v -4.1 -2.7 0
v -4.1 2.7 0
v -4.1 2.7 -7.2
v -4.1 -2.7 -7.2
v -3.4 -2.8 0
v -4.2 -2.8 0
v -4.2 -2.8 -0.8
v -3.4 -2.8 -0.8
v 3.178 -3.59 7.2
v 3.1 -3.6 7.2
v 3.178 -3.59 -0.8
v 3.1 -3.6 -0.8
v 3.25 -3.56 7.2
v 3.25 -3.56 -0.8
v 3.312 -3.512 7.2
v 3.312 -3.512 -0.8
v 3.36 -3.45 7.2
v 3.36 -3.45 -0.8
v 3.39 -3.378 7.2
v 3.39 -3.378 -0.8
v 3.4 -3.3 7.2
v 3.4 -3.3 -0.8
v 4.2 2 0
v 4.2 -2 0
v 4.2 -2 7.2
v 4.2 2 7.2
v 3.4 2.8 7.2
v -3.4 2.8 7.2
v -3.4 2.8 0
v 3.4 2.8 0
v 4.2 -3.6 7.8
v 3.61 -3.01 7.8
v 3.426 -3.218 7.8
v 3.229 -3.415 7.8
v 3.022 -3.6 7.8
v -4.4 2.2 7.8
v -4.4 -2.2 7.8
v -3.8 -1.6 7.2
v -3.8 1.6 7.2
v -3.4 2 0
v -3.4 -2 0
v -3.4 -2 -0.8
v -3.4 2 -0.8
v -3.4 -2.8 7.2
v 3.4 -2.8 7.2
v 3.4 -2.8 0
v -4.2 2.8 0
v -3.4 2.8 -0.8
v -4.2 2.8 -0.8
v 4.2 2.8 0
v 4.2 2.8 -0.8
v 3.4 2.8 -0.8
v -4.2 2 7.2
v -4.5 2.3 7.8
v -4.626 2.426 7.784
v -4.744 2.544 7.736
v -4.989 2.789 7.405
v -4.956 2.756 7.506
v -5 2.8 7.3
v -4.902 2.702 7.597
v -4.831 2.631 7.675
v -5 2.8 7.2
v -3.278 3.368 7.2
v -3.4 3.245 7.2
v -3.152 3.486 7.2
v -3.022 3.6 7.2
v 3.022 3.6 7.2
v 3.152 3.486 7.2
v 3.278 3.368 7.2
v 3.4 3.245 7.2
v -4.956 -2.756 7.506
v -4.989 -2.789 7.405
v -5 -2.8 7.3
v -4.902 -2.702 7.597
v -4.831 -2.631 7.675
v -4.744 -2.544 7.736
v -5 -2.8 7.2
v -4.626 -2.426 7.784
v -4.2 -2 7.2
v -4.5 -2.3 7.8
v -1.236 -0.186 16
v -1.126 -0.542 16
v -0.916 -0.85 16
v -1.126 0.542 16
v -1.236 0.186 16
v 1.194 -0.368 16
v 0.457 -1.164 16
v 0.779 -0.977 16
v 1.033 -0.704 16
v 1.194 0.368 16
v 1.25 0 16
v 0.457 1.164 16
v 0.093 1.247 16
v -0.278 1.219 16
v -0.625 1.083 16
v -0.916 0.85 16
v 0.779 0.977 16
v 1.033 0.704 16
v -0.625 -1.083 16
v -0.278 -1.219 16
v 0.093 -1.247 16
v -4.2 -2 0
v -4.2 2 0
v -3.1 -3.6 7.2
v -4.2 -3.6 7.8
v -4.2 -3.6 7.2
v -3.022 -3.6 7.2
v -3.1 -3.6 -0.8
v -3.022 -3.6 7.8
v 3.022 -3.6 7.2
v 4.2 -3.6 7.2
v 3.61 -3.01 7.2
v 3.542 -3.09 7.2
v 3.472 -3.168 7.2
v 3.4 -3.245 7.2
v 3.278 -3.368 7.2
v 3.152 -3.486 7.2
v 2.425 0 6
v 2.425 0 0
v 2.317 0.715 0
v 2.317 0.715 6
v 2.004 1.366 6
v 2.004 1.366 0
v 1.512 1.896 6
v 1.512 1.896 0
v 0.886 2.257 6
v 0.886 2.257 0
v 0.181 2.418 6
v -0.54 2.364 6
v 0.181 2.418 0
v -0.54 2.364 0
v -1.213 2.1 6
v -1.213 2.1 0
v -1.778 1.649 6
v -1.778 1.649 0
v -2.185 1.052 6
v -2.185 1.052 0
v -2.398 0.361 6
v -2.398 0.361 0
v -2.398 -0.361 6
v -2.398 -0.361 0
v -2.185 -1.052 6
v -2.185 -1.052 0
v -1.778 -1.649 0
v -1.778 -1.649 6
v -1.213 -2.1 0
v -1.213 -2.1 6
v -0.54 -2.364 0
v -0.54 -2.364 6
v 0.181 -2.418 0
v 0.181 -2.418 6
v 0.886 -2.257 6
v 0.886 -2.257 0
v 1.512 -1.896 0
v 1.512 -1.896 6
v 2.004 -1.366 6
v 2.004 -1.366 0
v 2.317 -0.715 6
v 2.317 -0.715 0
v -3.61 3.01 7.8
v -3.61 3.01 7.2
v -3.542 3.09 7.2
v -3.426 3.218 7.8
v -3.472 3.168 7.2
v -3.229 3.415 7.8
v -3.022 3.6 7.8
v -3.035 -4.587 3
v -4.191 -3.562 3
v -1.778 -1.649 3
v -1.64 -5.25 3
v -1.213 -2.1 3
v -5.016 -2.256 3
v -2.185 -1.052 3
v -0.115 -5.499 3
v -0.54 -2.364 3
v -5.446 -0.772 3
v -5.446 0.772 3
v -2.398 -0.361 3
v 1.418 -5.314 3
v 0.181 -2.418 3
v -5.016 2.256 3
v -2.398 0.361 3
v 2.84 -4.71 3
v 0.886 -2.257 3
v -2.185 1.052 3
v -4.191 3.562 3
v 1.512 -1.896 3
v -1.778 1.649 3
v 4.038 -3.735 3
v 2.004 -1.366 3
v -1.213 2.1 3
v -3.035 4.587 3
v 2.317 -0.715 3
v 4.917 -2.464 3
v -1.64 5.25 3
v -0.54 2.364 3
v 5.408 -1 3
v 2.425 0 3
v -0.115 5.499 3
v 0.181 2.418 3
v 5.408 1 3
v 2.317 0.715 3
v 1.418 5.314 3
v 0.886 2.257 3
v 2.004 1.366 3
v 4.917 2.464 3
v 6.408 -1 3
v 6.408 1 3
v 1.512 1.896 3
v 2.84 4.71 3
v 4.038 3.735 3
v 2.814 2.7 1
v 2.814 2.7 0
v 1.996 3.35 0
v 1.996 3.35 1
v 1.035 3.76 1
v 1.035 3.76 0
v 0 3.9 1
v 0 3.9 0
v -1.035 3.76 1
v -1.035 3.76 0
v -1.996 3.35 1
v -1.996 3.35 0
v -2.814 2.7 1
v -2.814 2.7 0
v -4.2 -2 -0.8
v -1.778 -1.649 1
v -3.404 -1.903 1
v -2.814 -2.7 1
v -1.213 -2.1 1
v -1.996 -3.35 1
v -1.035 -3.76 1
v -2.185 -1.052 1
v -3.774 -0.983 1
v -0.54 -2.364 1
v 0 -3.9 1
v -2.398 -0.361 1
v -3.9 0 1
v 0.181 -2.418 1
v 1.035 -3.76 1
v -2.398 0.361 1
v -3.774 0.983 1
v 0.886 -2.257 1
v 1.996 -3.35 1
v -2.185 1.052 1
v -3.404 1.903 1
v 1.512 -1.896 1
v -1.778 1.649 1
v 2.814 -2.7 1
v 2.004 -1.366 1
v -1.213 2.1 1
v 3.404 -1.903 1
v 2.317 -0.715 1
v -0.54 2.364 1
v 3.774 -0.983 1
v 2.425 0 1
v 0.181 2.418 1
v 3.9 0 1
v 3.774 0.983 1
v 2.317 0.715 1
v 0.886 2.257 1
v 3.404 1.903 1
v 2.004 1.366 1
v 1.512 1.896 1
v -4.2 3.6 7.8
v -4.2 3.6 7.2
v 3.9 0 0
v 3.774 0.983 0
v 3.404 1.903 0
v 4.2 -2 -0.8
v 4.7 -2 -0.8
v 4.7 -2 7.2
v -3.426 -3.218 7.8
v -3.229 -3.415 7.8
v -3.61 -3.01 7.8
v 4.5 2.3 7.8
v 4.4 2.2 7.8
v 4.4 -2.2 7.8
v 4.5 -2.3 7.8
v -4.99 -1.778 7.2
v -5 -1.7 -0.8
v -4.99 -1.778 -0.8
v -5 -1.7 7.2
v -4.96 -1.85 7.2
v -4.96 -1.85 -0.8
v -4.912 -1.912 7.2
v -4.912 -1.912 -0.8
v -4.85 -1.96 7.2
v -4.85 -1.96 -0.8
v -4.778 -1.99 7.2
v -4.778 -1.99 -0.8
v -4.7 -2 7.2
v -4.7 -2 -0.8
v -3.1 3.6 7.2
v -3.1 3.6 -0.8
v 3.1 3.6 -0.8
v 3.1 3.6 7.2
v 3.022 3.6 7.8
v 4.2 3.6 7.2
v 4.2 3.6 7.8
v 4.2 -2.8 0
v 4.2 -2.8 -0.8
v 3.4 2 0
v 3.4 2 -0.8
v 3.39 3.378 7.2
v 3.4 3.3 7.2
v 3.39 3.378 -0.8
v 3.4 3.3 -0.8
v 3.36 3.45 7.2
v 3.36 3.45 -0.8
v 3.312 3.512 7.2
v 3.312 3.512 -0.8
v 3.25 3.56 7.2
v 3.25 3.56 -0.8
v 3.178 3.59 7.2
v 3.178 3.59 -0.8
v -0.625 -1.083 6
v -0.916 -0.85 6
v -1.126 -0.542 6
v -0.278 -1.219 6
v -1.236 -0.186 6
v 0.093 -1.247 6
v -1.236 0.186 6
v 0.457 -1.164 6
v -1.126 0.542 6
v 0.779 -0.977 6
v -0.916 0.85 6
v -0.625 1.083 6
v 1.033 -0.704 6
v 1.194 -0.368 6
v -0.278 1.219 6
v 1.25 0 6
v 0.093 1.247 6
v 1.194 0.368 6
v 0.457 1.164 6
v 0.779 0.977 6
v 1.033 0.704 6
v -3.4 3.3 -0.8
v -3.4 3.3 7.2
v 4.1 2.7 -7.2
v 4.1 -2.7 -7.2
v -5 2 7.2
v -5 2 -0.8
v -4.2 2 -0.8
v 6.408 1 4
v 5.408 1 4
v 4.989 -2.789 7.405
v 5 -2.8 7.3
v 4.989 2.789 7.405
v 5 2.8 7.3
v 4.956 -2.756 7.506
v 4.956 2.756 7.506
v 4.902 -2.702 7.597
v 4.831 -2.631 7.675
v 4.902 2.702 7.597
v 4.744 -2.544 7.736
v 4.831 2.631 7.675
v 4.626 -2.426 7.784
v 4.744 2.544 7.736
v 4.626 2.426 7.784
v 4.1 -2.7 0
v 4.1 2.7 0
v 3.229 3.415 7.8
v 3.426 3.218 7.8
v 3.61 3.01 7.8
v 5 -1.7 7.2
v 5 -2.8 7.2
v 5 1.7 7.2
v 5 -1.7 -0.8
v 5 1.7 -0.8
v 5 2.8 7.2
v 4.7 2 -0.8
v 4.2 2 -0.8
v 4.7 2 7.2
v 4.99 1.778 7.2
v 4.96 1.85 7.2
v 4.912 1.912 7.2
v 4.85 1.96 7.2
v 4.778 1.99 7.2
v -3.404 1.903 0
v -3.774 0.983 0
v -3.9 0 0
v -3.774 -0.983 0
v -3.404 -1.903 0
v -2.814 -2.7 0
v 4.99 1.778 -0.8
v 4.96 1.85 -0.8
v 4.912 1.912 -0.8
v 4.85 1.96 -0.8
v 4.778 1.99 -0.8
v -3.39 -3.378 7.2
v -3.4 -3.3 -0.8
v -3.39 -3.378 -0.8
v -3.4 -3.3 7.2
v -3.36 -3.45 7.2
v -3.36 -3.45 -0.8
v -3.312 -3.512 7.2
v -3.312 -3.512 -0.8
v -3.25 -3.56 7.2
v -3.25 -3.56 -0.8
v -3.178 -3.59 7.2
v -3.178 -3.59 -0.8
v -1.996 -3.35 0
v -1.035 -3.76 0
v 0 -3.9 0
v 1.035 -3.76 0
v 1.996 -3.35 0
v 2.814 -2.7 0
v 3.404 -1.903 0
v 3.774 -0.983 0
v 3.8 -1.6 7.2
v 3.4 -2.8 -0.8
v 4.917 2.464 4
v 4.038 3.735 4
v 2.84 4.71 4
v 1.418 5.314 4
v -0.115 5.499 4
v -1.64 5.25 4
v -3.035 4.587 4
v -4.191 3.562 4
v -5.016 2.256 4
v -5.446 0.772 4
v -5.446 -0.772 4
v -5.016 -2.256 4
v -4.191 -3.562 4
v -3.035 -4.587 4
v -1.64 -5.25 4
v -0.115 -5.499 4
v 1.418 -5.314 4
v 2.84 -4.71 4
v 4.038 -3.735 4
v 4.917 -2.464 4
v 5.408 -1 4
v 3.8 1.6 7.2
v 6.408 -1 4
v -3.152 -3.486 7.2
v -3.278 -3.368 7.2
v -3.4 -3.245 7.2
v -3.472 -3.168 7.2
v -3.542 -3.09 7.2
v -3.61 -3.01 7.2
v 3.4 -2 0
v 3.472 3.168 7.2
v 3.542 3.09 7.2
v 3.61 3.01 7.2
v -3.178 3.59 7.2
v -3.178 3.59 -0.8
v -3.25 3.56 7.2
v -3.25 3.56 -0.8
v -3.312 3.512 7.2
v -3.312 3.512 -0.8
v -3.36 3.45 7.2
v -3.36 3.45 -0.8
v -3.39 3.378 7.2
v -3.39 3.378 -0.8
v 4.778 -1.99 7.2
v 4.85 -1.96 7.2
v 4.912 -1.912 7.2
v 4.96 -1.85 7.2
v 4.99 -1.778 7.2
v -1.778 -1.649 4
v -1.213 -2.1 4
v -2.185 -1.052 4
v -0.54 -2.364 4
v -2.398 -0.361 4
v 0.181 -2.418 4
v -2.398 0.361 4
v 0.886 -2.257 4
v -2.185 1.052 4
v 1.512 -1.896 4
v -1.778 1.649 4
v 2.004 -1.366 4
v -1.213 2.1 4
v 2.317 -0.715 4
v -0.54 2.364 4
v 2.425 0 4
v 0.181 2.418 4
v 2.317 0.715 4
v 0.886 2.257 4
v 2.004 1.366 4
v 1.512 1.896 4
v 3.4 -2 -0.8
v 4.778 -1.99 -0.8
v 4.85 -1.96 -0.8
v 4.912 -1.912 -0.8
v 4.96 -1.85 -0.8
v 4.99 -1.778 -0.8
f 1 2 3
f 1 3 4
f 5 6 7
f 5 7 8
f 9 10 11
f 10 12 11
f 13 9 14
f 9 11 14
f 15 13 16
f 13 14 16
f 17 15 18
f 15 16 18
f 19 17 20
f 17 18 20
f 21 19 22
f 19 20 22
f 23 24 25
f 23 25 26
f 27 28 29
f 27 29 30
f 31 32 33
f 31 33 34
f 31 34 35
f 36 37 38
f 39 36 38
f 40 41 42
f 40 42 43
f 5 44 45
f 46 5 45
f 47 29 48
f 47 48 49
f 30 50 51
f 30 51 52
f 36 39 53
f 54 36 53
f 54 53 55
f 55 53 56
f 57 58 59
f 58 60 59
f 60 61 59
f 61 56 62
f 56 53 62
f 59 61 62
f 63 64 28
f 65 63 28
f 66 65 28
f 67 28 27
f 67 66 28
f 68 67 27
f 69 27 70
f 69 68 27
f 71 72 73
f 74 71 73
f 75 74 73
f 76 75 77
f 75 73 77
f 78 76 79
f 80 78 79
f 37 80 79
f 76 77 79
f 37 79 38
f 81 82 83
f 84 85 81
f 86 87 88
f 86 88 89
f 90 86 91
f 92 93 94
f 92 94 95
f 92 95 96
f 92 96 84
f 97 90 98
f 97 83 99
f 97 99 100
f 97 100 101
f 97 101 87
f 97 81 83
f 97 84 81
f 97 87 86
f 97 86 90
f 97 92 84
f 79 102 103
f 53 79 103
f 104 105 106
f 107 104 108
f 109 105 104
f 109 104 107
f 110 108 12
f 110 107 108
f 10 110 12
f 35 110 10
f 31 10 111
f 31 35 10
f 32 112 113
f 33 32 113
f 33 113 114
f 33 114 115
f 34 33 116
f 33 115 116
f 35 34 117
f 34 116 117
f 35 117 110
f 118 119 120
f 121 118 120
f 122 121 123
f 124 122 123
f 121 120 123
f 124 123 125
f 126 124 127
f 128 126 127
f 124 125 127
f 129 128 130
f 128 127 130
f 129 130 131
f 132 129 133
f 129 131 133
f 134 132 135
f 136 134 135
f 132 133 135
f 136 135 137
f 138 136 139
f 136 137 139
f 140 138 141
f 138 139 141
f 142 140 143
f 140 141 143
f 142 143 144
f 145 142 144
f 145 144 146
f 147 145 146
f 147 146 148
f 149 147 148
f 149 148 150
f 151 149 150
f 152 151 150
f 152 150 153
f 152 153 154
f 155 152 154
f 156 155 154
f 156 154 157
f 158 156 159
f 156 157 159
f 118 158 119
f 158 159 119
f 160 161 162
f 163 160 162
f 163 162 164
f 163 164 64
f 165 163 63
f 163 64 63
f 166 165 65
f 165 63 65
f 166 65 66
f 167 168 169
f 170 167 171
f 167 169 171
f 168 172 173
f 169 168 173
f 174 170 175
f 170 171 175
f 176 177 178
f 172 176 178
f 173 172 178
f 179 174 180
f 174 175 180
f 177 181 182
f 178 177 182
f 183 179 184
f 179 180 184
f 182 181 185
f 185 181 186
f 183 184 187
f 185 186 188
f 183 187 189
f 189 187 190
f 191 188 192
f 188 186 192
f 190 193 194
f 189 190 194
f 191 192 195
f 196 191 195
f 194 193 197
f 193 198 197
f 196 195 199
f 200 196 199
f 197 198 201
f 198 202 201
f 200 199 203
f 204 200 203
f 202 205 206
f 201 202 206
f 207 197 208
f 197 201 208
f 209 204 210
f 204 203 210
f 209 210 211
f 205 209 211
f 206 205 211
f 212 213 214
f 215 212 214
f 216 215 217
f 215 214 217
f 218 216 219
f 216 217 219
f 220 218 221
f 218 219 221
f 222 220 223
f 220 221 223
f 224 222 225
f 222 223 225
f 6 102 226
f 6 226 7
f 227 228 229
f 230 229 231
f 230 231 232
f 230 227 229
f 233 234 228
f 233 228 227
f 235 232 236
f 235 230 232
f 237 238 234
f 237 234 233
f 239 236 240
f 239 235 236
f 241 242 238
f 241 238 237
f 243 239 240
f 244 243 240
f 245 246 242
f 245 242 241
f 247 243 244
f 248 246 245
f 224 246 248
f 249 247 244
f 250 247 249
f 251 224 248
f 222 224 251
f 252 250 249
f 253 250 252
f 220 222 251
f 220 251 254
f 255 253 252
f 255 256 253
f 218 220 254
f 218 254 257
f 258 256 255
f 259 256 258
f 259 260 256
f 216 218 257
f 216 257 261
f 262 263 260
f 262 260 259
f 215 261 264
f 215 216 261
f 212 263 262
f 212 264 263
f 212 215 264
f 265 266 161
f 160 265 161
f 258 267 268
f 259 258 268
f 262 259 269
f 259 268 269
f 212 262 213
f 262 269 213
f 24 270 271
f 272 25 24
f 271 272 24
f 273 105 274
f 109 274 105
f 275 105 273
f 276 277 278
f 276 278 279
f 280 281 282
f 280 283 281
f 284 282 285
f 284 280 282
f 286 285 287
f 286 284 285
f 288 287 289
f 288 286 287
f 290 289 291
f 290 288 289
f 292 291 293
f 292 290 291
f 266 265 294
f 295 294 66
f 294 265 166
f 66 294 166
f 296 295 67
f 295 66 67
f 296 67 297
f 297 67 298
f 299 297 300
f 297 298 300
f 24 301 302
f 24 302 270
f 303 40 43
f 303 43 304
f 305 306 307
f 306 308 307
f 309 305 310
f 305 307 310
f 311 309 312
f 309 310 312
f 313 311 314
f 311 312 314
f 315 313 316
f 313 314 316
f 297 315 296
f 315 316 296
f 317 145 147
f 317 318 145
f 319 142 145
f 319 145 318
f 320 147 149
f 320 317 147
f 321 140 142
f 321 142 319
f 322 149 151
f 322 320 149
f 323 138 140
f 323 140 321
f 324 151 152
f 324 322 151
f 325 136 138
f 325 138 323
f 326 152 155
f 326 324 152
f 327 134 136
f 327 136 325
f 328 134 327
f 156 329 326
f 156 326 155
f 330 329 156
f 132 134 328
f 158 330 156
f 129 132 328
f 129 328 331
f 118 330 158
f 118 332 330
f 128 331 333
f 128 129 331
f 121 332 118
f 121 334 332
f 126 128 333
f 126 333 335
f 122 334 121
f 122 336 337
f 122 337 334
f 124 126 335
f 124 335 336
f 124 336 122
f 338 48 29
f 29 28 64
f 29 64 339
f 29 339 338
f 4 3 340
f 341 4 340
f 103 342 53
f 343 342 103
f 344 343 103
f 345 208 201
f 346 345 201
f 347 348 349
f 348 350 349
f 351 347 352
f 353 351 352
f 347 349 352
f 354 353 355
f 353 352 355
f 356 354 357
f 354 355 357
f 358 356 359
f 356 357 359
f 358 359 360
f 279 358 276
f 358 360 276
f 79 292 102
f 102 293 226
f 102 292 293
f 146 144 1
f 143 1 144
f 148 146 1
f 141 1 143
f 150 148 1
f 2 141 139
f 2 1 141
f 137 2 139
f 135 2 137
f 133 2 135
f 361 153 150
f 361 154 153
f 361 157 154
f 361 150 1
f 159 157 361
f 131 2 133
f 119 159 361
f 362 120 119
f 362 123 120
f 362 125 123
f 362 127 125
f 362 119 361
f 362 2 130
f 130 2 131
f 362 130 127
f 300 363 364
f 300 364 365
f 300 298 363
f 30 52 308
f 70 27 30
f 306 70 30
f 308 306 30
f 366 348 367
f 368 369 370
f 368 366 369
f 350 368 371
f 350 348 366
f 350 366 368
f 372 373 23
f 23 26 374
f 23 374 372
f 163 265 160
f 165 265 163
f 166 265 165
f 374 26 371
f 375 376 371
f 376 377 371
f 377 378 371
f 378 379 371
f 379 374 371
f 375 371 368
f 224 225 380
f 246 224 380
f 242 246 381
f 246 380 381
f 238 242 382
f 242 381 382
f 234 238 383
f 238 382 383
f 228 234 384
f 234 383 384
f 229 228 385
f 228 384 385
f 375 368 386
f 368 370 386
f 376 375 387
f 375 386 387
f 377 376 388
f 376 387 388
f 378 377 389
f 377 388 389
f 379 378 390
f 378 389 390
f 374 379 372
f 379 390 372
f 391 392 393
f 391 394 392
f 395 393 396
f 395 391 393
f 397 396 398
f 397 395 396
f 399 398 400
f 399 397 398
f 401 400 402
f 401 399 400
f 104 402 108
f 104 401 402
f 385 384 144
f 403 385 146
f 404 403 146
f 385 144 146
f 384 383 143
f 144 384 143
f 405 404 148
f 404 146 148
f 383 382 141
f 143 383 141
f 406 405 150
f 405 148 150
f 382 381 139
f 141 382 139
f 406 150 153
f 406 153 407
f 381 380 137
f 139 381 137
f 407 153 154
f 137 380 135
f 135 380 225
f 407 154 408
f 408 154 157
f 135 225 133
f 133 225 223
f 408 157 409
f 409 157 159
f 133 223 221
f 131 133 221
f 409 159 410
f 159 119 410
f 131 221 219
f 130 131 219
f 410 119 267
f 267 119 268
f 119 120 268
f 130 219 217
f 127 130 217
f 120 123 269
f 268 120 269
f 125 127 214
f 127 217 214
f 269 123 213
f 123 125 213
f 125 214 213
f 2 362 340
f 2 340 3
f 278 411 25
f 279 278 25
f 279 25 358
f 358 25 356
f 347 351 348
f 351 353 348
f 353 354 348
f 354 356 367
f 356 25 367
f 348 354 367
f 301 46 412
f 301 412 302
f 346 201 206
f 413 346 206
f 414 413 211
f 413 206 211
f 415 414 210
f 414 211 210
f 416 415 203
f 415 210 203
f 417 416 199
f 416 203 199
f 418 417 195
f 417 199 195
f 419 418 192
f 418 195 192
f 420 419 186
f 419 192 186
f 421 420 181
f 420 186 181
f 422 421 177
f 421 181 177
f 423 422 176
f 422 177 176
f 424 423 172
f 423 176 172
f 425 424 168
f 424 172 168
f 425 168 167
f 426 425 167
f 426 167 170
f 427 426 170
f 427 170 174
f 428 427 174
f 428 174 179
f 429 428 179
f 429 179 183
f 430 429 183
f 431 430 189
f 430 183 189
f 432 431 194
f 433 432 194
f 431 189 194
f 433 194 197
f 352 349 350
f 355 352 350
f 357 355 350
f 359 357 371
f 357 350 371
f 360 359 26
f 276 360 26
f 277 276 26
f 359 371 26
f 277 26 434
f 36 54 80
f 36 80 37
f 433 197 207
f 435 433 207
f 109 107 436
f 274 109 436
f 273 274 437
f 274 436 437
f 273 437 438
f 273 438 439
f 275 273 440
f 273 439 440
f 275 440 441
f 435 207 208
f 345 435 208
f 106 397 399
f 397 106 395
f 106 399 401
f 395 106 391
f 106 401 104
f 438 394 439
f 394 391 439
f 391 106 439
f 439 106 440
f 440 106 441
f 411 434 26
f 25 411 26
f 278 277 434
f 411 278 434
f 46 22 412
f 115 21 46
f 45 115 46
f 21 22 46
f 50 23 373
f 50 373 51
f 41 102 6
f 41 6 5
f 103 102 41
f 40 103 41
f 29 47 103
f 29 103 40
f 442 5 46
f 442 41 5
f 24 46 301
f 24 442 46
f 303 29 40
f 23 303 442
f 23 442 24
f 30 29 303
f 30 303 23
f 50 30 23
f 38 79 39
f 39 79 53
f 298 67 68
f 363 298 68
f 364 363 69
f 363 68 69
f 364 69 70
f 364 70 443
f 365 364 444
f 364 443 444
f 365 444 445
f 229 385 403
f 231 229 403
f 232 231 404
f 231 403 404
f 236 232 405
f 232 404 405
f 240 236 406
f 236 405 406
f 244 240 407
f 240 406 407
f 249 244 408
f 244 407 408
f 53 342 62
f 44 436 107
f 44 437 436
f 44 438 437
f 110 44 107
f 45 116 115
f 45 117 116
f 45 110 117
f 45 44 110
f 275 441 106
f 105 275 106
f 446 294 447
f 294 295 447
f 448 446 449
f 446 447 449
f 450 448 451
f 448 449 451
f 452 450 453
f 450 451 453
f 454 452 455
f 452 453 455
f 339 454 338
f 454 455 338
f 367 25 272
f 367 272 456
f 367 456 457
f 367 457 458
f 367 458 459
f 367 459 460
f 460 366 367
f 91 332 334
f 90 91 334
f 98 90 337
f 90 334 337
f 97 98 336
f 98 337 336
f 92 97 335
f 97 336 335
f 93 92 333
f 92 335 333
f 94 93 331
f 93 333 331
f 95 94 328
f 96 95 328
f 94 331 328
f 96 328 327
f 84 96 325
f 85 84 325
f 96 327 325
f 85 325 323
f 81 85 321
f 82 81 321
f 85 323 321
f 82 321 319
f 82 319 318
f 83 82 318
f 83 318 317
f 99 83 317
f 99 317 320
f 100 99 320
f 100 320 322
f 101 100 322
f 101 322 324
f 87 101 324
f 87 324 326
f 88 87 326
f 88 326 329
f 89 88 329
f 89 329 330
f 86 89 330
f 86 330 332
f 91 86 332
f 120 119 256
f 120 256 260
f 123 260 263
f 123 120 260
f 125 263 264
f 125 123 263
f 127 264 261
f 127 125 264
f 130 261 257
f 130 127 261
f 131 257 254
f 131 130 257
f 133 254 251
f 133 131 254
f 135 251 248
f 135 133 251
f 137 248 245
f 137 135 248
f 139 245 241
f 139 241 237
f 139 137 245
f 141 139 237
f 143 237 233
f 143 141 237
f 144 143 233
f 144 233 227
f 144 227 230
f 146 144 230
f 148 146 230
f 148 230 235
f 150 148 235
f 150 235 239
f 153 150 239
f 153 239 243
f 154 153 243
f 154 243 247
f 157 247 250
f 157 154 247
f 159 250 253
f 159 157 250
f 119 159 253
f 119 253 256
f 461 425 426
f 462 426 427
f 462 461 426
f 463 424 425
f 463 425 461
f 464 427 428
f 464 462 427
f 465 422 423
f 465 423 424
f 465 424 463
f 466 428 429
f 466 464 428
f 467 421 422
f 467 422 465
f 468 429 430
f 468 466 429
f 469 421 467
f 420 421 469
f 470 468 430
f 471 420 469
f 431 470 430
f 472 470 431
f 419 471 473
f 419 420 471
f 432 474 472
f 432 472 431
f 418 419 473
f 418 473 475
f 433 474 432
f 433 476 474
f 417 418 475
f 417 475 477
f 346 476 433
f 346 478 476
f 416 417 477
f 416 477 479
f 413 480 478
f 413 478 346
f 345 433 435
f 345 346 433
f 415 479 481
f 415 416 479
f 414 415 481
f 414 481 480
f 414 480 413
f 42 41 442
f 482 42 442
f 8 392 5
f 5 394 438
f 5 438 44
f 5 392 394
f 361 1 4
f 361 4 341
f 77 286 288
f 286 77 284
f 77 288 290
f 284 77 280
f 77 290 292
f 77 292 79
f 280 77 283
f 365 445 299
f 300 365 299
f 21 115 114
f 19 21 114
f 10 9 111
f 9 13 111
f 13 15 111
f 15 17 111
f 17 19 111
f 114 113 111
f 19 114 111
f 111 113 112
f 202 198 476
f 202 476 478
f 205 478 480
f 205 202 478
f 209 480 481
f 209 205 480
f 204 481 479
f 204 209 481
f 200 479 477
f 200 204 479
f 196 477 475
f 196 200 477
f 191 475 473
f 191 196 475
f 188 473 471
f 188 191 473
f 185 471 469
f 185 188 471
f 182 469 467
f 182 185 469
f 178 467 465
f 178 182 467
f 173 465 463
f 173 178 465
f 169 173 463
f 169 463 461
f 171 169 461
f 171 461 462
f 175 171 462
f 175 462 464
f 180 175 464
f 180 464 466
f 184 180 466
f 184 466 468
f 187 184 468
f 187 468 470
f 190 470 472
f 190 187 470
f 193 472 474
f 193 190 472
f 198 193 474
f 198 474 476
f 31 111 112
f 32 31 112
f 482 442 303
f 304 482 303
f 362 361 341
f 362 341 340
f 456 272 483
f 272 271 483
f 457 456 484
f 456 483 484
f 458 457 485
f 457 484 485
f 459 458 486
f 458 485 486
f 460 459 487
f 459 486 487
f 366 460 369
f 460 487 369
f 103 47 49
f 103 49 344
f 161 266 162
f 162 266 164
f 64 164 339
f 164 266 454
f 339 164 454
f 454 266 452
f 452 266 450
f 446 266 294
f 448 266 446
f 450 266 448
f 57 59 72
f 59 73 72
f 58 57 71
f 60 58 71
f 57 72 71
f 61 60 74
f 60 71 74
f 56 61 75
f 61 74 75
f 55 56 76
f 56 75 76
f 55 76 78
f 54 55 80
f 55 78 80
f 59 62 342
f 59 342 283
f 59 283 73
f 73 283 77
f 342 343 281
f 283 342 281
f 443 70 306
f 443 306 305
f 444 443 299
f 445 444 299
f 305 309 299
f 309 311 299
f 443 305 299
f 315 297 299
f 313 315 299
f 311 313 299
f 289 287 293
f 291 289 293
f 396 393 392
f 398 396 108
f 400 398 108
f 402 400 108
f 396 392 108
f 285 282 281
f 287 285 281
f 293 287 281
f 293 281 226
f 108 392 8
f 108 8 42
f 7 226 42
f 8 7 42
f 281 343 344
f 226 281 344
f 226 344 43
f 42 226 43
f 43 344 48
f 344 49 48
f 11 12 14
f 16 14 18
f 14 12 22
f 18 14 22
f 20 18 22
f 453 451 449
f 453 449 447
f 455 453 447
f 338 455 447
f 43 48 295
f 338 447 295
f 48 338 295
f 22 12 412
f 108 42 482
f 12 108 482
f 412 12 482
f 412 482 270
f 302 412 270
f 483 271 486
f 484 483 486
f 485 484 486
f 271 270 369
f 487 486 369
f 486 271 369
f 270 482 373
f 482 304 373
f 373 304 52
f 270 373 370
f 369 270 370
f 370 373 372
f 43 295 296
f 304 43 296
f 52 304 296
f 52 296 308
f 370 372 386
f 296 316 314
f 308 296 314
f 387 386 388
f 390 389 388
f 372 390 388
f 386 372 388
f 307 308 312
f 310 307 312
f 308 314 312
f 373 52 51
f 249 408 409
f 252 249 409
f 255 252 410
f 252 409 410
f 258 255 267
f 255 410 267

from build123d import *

# Parameters (mm, degrees)
F2_R           = 2.425
F2_R_2         = 1.25
F3_DEPTH       = 7.2
F4_DEPTH       = 6
F5_DEPTH       = 1
F6_START       = 3
F6_DEPTH       = 1
F7_DEPTH       = 16
F8_W           = 6.8
F8_H           = 0.8
F8_W_2         = 0.8
F8_H_2         = 4
F9_DEPTH       = 0.8
F10_DEPTH      = 7.2
F10_DEPTH_BACK = 0.8
F12_DEPTH      = 0.6
F13_R          = 0.5
F14_R          = 0.3
F15_T4_DEPTH   = 7.5433659759
F15_T10_DEPTH  = 7.5433659759


# Not quite as in the source:
# - a fillet or chamfer that OpenCascade refuses, or shapes differently, is made with other operations: its cross-section is extruded or revolved along the edge and cut away or added
# - a feature names something its author has since deleted; it is built from what else it names


with BuildPart() as f3:
    # F2 (on Top) → F3 (new body)
    with BuildSketch(Plane.XY):
        with BuildLine():
            Line((-2.8142494559, -2.7), (2.8142494559, -2.7))
            ThreePointArc((2.8142494559, -2.7), (3.6183955614, -1.4550647962), (3.9, 0))
            ThreePointArc((3.9, 0), (3.6183955614, 1.4550647962), (2.8142494559, 2.7))
            Line((2.8142494559, 2.7), (-2.8142494559, 2.7))
            ThreePointArc((-2.8142494559, 2.7), (-3.9, 0), (-2.8142494559, -2.7))
        make_face()
        Circle(F2_R, mode=Mode.SUBTRACT)
        Circle(F2_R)
        Circle(F2_R_2, mode=Mode.SUBTRACT)
        Circle(F2_R_2)
        with BuildLine():
            Line((2.8142494559, -2.7), (4.1, -2.7))
            Line((4.1, -2.7), (4.1, 2.7))
            Line((4.1, 2.7), (2.8142494559, 2.7))
            ThreePointArc((2.8142494559, 2.7), (3.6183955614, 1.4550647962), (3.9, 0))
            ThreePointArc((3.9, 0), (3.6183955614, -1.4550647962), (2.8142494559, -2.7))
        make_face()
        with BuildLine():
            Line((-4.1, -2.7), (-2.8142494559, -2.7))
            ThreePointArc((-2.8142494559, -2.7), (-3.9, 0), (-2.8142494559, 2.7))
            Line((-2.8142494559, 2.7), (-4.1, 2.7))
            Line((-4.1, 2.7), (-4.1, -2.7))
        make_face()
    extrude(amount=-F3_DEPTH)

    # F2 (on Top) → F4 (join)
    with BuildSketch(Plane.XY):
        Circle(F2_R)
        Circle(F2_R_2, mode=Mode.SUBTRACT)
        Circle(F2_R_2)
    extrude(amount=F4_DEPTH)

    # F2 (on Top) → F7 (join)
    with BuildSketch(Plane.XY):
        Circle(F2_R_2)
    extrude(amount=F7_DEPTH)


with BuildPart() as f5:
    # F2 (on Top) → F5 (new body)
    with BuildSketch(Plane.XY):
        with BuildLine():
            Line((-2.8142494559, -2.7), (2.8142494559, -2.7))
            ThreePointArc((2.8142494559, -2.7), (3.6183955614, -1.4550647962), (3.9, 0))
            ThreePointArc((3.9, 0), (3.6183955614, 1.4550647962), (2.8142494559, 2.7))
            Line((2.8142494559, 2.7), (-2.8142494559, 2.7))
            ThreePointArc((-2.8142494559, 2.7), (-3.9, 0), (-2.8142494559, -2.7))
        make_face()
        Circle(F2_R, mode=Mode.SUBTRACT)
        with BuildLine():
            ThreePointArc((-2.8142494559, -2.7), (0, -3.9), (2.8142494559, -2.7))
            Line((2.8142494559, -2.7), (-2.8142494559, -2.7))
        make_face()
        with BuildLine():
            Line((-2.8142494559, 2.7), (2.8142494559, 2.7))
            ThreePointArc((2.8142494559, 2.7), (0, 3.9), (-2.8142494559, 2.7))
        make_face()
    extrude(amount=F5_DEPTH)


with BuildPart() as f6:
    # F2 (on Top) → F6 (new body)
    with BuildSketch(Plane.XY.offset(F6_START)):
        with BuildLine():
            Line((5.4083269132, -1), (5.4083269132, 1))
            ThreePointArc((5.4083269132, 1), (-5.5, 0), (5.4083269132, -1))
        make_face()
        with BuildLine():
            Line((4.1, 2.7), (4.1, -2.7))
            Line((4.1, -2.7), (2.8142494559, -2.7))
            ThreePointArc((2.8142494559, -2.7), (0, -3.9), (-2.8142494559, -2.7))
            Line((-2.8142494559, -2.7), (-4.1, -2.7))
            Line((-4.1, -2.7), (-4.1, 2.7))
            Line((-4.1, 2.7), (-2.8142494559, 2.7))
            ThreePointArc((-2.8142494559, 2.7), (0, 3.9), (2.8142494559, 2.7))
            Line((2.8142494559, 2.7), (4.1, 2.7))
        make_face(mode=Mode.SUBTRACT)
        with BuildLine():
            Line((-4.1, -2.7), (-2.8142494559, -2.7))
            ThreePointArc((-2.8142494559, -2.7), (-3.9, 0), (-2.8142494559, 2.7))
            Line((-2.8142494559, 2.7), (-4.1, 2.7))
            Line((-4.1, 2.7), (-4.1, -2.7))
        make_face()
        with BuildLine():
            Line((2.8142494559, -2.7), (4.1, -2.7))
            Line((4.1, -2.7), (4.1, 2.7))
            Line((4.1, 2.7), (2.8142494559, 2.7))
            ThreePointArc((2.8142494559, 2.7), (3.6183955614, 1.4550647962), (3.9, 0))
            ThreePointArc((3.9, 0), (3.6183955614, -1.4550647962), (2.8142494559, -2.7))
        make_face()
        with BuildLine():
            ThreePointArc((5.4083269132, 1), (5.4770337785, 0.502096593), (5.5, 0))
            ThreePointArc((5.5, 0), (5.4770337785, -0.502096593), (5.4083269132, -1))
            Line((5.4083269132, -1), (6.4083269132, -1))
            Line((6.4083269132, -1), (6.4083269132, 1))
            Line((6.4083269132, 1), (5.4083269132, 1))
        make_face()
        with BuildLine():
            ThreePointArc((5.4083269132, -1), (5.4770337785, -0.502096593), (5.5, 0))
            ThreePointArc((5.5, 0), (5.4770337785, 0.502096593), (5.4083269132, 1))
            Line((5.4083269132, 1), (5.4083269132, -1))
        make_face()
        with BuildLine():
            Line((-2.8142494559, 2.7), (2.8142494559, 2.7))
            ThreePointArc((2.8142494559, 2.7), (0, 3.9), (-2.8142494559, 2.7))
        make_face()
        with BuildLine():
            Line((-2.8142494559, -2.7), (2.8142494559, -2.7))
            ThreePointArc((2.8142494559, -2.7), (3.6183955614, -1.4550647962), (3.9, 0))
            ThreePointArc((3.9, 0), (3.6183955614, 1.4550647962), (2.8142494559, 2.7))
            Line((2.8142494559, 2.7), (-2.8142494559, 2.7))
            ThreePointArc((-2.8142494559, 2.7), (-3.9, 0), (-2.8142494559, -2.7))
        make_face()
        Circle(F2_R, mode=Mode.SUBTRACT)
        with BuildLine():
            ThreePointArc((-2.8142494559, -2.7), (0, -3.9), (2.8142494559, -2.7))
            Line((2.8142494559, -2.7), (-2.8142494559, -2.7))
        make_face()
    extrude(amount=F6_DEPTH)


with BuildPart() as f9:
    # F8 (on Top) → F9 (new body)
    with BuildSketch(Plane.XY):
        with Locations((0, 2.4)):
            Rectangle(F8_W, F8_H)
        with Locations((-3.8, 2.4)):
            Rectangle(F8_W_2, F8_H)
        with Locations((-3.8, 0)):
            Rectangle(F8_W_2, F8_H_2)
        with Locations((-3.8, -2.4)):
            Rectangle(F8_W_2, F8_H)
        with Locations((0, -2.4)):
            Rectangle(F8_W, F8_H)
        with Locations((3.8, 0)):
            Rectangle(F8_W_2, F8_H_2)
        with Locations((3.8, -2.4)):
            Rectangle(F8_W_2, F8_H)
        with Locations((3.8, 2.4)):
            Rectangle(F8_W_2, F8_H)
        with Locations((-4.6, 0)):
            Rectangle(F8_W_2, F8_H_2)
        with Locations((0, 3.2)):
            Rectangle(F8_W, F8_H)
        with Locations((0, -3.2)):
            Rectangle(F8_W, F8_H)
        with Locations((4.6, 0)):
            Rectangle(F8_W_2, F8_H_2)
    extrude(amount=-F9_DEPTH)

    # F8 (on Top) → F10 (join, two sides)
    with BuildSketch(Plane.XY) as f10_sk:
        with Locations((-4.6, 0)):
            Rectangle(F8_W_2, F8_H_2)
        with Locations((4.6, 0)):
            Rectangle(F8_W_2, F8_H_2)
        with Locations((0, -3.2)):
            Rectangle(F8_W, F8_H)
        with Locations((0, 3.2)):
            Rectangle(F8_W, F8_H)
    extrude(amount=F10_DEPTH)
    extrude(f10_sk.sketch, amount=-F10_DEPTH_BACK)

    # F11 (on face) → F12 (join)
    with BuildSketch(Plane.XY.offset(7.2)):
        with BuildLine():
            Line((-4.2360803561, 2.0360803561), (-5, 2.8))
            Line((-5, 2.8), (-5, -2.8))
            Line((-5, -2.8), (-4.2360803561, -2.0360803561))
            ThreePointArc((-4.2360803561, -2.0360803561), (-4.7, 0), (-4.2360803561, 2.0360803561))
        make_face()
        with BuildLine():
            Line((5, 2.8), (4.2360803561, 2.0360803561))
            ThreePointArc((4.2360803561, 2.0360803561), (4.2446955459, 2.0180584042), (4.2532340636, 2))
            Line((4.2532340636, 2), (5, 2))
            Line((5, 2), (5, 2.8))
        make_face()
        with BuildLine():
            Line((5, -2.8), (5, -2))
            Line((5, -2), (4.2532340636, -2))
            ThreePointArc((4.2532340636, -2), (4.2446955459, -2.0180584042), (4.2360803561, -2.0360803561))
            Line((4.2360803561, -2.0360803561), (5, -2.8))
        make_face()
        with BuildLine():
            Line((5, 2), (4.2532340636, 2))
            ThreePointArc((4.2532340636, 2), (4.5869488824, 1.0246462563), (4.7, 0))
            ThreePointArc((4.7, 0), (4.5869488824, -1.0246462563), (4.2532340636, -2))
            Line((4.2532340636, -2), (5, -2))
            Line((5, -2), (5, 2))
        make_face()
        with BuildLine():
            ThreePointArc((4.7, 0), (4.5869488824, 1.0246462563), (4.2532340636, 2))
            Line((4.2532340636, 2), (4.2, 2))
            Line((4.2, 2), (4.2, -2))
            Line((4.2, -2), (4.2532340636, -2))
            ThreePointArc((4.2532340636, -2), (4.5869488824, -1.0246462563), (4.7, 0))
        make_face()
        with BuildLine():
            Line((-3.0215889859, 3.6), (-4.2, 3.6))
            Line((-4.2, 3.6), (-3.6098338327, 3.0098338327))
            ThreePointArc((-3.6098338327, 3.0098338327), (-3.3288160322, 3.3179788763), (-3.0215889859, 3.6))
        make_face()
        with BuildLine():
            ThreePointArc((3.6098338327, -3.0098338327), (3.3288160322, -3.3179788763), (3.0215889859, -3.6))
            Line((3.0215889859, -3.6), (4.2, -3.6))
            Line((4.2, -3.6), (3.6098338327, -3.0098338327))
        make_face()
        with BuildLine():
            Line((4.2, 3.6), (3.0215889859, 3.6))
            ThreePointArc((3.0215889859, 3.6), (3.3288160322, 3.3179788763), (3.6098338327, 3.0098338327))
            Line((3.6098338327, 3.0098338327), (4.2, 3.6))
        make_face()
        with BuildLine():
            Line((-3.6098338327, -3.0098338327), (-4.2, -3.6))
            Line((-4.2, -3.6), (-3.0215889859, -3.6))
            ThreePointArc((-3.0215889859, -3.6), (-3.3288160322, -3.3179788763), (-3.6098338327, -3.0098338327))
        make_face()
        with BuildLine():
            Line((4.2532340636, -2), (4.2, -2))
            Line((4.2, -2), (4.2360803561, -2.0360803561))
            ThreePointArc((4.2360803561, -2.0360803561), (4.2446955459, -2.0180584042), (4.2532340636, -2))
        make_face()
        with BuildLine():
            ThreePointArc((4.2532340636, 2), (4.2446955459, 2.0180584042), (4.2360803561, 2.0360803561))
            Line((4.2360803561, 2.0360803561), (4.2, 2))
            Line((4.2, 2), (4.2532340636, 2))
        make_face()
        with BuildLine():
            Line((-3.4, 1.2), (-4.2360803561, 2.0360803561))
            ThreePointArc((-4.2360803561, 2.0360803561), (-4.7, 0), (-4.2360803561, -2.0360803561))
            Line((-4.2360803561, -2.0360803561), (-3.4, -1.2))
            Line((-3.4, -1.2), (-3.4, 1.2))
        make_face()
        Polygon((4.2, -2), (4.2, 2), (3.4, 1.2), (3.4, -1.2), align=None)
    extrude(amount=F12_DEPTH)

    # F13
    f13_edges = [f9.edges().sort_by_distance(p)[0] for p in [
        (-5, 0, 7.8),
        (5, 0, 7.8),
    ]]
    fillet(f13_edges, radius=F13_R)

    # F14
    f14_edges = [f9.edges().sort_by_distance(p)[0] for p in [
        (5, 2, 3.2),
        (3.4, 3.6, 3.2),
        (-3.4, 3.6, 3.2),
        (5, -2, 3.2),
        (3.4, -3.6, 3.2),
        (-3.4, -3.6, 3.2),
        (-5, -2, 3.2),
    ]]
    fillet(f14_edges, radius=F14_R)

    # F15: chamfer of 1 on 2 edges, made by hand


with BuildPart() as f15_tool2:
    # F15_s3 → F15_t4 (new body)
    with BuildSketch(Plane.XZ.offset(-3.771682988)):
        Polygon((4.4, 7.8), (3.4, 6.8), (3.4, 7.8), align=None)
    extrude(amount=F15_T4_DEPTH)

    split(bisect_by=Plane(origin=(1.1, -1.1, 0), x_dir=(0, 0, 1), z_dir=(0.7071067812, -0.7071067812, 0)), keep=Keep.TOP)

    split(bisect_by=Plane(origin=(0.3, 0.3, 0), x_dir=(0, 0, 1), z_dir=(0.7071067812, 0.7071067812, 0)), keep=Keep.TOP)


with BuildPart() as f9_1:
    add(f9.part)

    # F15_t1: cut F15_tool2
    add(f15_tool2.part, mode=Mode.SUBTRACT)


with BuildPart() as f15_tool8:
    # F15_s9 → F15_t10 (new body)
    with BuildSketch(Plane.XZ.offset(3.771682988)):
        Polygon((-4.4, 7.8), (-3.4, 6.8), (-3.4, 7.8), align=None)
    extrude(amount=-F15_T10_DEPTH)

    split(bisect_by=Plane.XZ.offset(-2.8), keep=Keep.TOP)

    split(bisect_by=Plane(origin=(-0.3, 0.3, 0), x_dir=(0, 0, 1), z_dir=(-0.7071067812, 0.7071067812, 0)), keep=Keep.TOP)


with BuildPart() as f9_2:
    add(f9_1.part)

    # F15_t7: cut F15_tool8
    add(f15_tool8.part, mode=Mode.SUBTRACT)


solid = Compound([f3.part, f5.part, f6.part, f9_2.part])
